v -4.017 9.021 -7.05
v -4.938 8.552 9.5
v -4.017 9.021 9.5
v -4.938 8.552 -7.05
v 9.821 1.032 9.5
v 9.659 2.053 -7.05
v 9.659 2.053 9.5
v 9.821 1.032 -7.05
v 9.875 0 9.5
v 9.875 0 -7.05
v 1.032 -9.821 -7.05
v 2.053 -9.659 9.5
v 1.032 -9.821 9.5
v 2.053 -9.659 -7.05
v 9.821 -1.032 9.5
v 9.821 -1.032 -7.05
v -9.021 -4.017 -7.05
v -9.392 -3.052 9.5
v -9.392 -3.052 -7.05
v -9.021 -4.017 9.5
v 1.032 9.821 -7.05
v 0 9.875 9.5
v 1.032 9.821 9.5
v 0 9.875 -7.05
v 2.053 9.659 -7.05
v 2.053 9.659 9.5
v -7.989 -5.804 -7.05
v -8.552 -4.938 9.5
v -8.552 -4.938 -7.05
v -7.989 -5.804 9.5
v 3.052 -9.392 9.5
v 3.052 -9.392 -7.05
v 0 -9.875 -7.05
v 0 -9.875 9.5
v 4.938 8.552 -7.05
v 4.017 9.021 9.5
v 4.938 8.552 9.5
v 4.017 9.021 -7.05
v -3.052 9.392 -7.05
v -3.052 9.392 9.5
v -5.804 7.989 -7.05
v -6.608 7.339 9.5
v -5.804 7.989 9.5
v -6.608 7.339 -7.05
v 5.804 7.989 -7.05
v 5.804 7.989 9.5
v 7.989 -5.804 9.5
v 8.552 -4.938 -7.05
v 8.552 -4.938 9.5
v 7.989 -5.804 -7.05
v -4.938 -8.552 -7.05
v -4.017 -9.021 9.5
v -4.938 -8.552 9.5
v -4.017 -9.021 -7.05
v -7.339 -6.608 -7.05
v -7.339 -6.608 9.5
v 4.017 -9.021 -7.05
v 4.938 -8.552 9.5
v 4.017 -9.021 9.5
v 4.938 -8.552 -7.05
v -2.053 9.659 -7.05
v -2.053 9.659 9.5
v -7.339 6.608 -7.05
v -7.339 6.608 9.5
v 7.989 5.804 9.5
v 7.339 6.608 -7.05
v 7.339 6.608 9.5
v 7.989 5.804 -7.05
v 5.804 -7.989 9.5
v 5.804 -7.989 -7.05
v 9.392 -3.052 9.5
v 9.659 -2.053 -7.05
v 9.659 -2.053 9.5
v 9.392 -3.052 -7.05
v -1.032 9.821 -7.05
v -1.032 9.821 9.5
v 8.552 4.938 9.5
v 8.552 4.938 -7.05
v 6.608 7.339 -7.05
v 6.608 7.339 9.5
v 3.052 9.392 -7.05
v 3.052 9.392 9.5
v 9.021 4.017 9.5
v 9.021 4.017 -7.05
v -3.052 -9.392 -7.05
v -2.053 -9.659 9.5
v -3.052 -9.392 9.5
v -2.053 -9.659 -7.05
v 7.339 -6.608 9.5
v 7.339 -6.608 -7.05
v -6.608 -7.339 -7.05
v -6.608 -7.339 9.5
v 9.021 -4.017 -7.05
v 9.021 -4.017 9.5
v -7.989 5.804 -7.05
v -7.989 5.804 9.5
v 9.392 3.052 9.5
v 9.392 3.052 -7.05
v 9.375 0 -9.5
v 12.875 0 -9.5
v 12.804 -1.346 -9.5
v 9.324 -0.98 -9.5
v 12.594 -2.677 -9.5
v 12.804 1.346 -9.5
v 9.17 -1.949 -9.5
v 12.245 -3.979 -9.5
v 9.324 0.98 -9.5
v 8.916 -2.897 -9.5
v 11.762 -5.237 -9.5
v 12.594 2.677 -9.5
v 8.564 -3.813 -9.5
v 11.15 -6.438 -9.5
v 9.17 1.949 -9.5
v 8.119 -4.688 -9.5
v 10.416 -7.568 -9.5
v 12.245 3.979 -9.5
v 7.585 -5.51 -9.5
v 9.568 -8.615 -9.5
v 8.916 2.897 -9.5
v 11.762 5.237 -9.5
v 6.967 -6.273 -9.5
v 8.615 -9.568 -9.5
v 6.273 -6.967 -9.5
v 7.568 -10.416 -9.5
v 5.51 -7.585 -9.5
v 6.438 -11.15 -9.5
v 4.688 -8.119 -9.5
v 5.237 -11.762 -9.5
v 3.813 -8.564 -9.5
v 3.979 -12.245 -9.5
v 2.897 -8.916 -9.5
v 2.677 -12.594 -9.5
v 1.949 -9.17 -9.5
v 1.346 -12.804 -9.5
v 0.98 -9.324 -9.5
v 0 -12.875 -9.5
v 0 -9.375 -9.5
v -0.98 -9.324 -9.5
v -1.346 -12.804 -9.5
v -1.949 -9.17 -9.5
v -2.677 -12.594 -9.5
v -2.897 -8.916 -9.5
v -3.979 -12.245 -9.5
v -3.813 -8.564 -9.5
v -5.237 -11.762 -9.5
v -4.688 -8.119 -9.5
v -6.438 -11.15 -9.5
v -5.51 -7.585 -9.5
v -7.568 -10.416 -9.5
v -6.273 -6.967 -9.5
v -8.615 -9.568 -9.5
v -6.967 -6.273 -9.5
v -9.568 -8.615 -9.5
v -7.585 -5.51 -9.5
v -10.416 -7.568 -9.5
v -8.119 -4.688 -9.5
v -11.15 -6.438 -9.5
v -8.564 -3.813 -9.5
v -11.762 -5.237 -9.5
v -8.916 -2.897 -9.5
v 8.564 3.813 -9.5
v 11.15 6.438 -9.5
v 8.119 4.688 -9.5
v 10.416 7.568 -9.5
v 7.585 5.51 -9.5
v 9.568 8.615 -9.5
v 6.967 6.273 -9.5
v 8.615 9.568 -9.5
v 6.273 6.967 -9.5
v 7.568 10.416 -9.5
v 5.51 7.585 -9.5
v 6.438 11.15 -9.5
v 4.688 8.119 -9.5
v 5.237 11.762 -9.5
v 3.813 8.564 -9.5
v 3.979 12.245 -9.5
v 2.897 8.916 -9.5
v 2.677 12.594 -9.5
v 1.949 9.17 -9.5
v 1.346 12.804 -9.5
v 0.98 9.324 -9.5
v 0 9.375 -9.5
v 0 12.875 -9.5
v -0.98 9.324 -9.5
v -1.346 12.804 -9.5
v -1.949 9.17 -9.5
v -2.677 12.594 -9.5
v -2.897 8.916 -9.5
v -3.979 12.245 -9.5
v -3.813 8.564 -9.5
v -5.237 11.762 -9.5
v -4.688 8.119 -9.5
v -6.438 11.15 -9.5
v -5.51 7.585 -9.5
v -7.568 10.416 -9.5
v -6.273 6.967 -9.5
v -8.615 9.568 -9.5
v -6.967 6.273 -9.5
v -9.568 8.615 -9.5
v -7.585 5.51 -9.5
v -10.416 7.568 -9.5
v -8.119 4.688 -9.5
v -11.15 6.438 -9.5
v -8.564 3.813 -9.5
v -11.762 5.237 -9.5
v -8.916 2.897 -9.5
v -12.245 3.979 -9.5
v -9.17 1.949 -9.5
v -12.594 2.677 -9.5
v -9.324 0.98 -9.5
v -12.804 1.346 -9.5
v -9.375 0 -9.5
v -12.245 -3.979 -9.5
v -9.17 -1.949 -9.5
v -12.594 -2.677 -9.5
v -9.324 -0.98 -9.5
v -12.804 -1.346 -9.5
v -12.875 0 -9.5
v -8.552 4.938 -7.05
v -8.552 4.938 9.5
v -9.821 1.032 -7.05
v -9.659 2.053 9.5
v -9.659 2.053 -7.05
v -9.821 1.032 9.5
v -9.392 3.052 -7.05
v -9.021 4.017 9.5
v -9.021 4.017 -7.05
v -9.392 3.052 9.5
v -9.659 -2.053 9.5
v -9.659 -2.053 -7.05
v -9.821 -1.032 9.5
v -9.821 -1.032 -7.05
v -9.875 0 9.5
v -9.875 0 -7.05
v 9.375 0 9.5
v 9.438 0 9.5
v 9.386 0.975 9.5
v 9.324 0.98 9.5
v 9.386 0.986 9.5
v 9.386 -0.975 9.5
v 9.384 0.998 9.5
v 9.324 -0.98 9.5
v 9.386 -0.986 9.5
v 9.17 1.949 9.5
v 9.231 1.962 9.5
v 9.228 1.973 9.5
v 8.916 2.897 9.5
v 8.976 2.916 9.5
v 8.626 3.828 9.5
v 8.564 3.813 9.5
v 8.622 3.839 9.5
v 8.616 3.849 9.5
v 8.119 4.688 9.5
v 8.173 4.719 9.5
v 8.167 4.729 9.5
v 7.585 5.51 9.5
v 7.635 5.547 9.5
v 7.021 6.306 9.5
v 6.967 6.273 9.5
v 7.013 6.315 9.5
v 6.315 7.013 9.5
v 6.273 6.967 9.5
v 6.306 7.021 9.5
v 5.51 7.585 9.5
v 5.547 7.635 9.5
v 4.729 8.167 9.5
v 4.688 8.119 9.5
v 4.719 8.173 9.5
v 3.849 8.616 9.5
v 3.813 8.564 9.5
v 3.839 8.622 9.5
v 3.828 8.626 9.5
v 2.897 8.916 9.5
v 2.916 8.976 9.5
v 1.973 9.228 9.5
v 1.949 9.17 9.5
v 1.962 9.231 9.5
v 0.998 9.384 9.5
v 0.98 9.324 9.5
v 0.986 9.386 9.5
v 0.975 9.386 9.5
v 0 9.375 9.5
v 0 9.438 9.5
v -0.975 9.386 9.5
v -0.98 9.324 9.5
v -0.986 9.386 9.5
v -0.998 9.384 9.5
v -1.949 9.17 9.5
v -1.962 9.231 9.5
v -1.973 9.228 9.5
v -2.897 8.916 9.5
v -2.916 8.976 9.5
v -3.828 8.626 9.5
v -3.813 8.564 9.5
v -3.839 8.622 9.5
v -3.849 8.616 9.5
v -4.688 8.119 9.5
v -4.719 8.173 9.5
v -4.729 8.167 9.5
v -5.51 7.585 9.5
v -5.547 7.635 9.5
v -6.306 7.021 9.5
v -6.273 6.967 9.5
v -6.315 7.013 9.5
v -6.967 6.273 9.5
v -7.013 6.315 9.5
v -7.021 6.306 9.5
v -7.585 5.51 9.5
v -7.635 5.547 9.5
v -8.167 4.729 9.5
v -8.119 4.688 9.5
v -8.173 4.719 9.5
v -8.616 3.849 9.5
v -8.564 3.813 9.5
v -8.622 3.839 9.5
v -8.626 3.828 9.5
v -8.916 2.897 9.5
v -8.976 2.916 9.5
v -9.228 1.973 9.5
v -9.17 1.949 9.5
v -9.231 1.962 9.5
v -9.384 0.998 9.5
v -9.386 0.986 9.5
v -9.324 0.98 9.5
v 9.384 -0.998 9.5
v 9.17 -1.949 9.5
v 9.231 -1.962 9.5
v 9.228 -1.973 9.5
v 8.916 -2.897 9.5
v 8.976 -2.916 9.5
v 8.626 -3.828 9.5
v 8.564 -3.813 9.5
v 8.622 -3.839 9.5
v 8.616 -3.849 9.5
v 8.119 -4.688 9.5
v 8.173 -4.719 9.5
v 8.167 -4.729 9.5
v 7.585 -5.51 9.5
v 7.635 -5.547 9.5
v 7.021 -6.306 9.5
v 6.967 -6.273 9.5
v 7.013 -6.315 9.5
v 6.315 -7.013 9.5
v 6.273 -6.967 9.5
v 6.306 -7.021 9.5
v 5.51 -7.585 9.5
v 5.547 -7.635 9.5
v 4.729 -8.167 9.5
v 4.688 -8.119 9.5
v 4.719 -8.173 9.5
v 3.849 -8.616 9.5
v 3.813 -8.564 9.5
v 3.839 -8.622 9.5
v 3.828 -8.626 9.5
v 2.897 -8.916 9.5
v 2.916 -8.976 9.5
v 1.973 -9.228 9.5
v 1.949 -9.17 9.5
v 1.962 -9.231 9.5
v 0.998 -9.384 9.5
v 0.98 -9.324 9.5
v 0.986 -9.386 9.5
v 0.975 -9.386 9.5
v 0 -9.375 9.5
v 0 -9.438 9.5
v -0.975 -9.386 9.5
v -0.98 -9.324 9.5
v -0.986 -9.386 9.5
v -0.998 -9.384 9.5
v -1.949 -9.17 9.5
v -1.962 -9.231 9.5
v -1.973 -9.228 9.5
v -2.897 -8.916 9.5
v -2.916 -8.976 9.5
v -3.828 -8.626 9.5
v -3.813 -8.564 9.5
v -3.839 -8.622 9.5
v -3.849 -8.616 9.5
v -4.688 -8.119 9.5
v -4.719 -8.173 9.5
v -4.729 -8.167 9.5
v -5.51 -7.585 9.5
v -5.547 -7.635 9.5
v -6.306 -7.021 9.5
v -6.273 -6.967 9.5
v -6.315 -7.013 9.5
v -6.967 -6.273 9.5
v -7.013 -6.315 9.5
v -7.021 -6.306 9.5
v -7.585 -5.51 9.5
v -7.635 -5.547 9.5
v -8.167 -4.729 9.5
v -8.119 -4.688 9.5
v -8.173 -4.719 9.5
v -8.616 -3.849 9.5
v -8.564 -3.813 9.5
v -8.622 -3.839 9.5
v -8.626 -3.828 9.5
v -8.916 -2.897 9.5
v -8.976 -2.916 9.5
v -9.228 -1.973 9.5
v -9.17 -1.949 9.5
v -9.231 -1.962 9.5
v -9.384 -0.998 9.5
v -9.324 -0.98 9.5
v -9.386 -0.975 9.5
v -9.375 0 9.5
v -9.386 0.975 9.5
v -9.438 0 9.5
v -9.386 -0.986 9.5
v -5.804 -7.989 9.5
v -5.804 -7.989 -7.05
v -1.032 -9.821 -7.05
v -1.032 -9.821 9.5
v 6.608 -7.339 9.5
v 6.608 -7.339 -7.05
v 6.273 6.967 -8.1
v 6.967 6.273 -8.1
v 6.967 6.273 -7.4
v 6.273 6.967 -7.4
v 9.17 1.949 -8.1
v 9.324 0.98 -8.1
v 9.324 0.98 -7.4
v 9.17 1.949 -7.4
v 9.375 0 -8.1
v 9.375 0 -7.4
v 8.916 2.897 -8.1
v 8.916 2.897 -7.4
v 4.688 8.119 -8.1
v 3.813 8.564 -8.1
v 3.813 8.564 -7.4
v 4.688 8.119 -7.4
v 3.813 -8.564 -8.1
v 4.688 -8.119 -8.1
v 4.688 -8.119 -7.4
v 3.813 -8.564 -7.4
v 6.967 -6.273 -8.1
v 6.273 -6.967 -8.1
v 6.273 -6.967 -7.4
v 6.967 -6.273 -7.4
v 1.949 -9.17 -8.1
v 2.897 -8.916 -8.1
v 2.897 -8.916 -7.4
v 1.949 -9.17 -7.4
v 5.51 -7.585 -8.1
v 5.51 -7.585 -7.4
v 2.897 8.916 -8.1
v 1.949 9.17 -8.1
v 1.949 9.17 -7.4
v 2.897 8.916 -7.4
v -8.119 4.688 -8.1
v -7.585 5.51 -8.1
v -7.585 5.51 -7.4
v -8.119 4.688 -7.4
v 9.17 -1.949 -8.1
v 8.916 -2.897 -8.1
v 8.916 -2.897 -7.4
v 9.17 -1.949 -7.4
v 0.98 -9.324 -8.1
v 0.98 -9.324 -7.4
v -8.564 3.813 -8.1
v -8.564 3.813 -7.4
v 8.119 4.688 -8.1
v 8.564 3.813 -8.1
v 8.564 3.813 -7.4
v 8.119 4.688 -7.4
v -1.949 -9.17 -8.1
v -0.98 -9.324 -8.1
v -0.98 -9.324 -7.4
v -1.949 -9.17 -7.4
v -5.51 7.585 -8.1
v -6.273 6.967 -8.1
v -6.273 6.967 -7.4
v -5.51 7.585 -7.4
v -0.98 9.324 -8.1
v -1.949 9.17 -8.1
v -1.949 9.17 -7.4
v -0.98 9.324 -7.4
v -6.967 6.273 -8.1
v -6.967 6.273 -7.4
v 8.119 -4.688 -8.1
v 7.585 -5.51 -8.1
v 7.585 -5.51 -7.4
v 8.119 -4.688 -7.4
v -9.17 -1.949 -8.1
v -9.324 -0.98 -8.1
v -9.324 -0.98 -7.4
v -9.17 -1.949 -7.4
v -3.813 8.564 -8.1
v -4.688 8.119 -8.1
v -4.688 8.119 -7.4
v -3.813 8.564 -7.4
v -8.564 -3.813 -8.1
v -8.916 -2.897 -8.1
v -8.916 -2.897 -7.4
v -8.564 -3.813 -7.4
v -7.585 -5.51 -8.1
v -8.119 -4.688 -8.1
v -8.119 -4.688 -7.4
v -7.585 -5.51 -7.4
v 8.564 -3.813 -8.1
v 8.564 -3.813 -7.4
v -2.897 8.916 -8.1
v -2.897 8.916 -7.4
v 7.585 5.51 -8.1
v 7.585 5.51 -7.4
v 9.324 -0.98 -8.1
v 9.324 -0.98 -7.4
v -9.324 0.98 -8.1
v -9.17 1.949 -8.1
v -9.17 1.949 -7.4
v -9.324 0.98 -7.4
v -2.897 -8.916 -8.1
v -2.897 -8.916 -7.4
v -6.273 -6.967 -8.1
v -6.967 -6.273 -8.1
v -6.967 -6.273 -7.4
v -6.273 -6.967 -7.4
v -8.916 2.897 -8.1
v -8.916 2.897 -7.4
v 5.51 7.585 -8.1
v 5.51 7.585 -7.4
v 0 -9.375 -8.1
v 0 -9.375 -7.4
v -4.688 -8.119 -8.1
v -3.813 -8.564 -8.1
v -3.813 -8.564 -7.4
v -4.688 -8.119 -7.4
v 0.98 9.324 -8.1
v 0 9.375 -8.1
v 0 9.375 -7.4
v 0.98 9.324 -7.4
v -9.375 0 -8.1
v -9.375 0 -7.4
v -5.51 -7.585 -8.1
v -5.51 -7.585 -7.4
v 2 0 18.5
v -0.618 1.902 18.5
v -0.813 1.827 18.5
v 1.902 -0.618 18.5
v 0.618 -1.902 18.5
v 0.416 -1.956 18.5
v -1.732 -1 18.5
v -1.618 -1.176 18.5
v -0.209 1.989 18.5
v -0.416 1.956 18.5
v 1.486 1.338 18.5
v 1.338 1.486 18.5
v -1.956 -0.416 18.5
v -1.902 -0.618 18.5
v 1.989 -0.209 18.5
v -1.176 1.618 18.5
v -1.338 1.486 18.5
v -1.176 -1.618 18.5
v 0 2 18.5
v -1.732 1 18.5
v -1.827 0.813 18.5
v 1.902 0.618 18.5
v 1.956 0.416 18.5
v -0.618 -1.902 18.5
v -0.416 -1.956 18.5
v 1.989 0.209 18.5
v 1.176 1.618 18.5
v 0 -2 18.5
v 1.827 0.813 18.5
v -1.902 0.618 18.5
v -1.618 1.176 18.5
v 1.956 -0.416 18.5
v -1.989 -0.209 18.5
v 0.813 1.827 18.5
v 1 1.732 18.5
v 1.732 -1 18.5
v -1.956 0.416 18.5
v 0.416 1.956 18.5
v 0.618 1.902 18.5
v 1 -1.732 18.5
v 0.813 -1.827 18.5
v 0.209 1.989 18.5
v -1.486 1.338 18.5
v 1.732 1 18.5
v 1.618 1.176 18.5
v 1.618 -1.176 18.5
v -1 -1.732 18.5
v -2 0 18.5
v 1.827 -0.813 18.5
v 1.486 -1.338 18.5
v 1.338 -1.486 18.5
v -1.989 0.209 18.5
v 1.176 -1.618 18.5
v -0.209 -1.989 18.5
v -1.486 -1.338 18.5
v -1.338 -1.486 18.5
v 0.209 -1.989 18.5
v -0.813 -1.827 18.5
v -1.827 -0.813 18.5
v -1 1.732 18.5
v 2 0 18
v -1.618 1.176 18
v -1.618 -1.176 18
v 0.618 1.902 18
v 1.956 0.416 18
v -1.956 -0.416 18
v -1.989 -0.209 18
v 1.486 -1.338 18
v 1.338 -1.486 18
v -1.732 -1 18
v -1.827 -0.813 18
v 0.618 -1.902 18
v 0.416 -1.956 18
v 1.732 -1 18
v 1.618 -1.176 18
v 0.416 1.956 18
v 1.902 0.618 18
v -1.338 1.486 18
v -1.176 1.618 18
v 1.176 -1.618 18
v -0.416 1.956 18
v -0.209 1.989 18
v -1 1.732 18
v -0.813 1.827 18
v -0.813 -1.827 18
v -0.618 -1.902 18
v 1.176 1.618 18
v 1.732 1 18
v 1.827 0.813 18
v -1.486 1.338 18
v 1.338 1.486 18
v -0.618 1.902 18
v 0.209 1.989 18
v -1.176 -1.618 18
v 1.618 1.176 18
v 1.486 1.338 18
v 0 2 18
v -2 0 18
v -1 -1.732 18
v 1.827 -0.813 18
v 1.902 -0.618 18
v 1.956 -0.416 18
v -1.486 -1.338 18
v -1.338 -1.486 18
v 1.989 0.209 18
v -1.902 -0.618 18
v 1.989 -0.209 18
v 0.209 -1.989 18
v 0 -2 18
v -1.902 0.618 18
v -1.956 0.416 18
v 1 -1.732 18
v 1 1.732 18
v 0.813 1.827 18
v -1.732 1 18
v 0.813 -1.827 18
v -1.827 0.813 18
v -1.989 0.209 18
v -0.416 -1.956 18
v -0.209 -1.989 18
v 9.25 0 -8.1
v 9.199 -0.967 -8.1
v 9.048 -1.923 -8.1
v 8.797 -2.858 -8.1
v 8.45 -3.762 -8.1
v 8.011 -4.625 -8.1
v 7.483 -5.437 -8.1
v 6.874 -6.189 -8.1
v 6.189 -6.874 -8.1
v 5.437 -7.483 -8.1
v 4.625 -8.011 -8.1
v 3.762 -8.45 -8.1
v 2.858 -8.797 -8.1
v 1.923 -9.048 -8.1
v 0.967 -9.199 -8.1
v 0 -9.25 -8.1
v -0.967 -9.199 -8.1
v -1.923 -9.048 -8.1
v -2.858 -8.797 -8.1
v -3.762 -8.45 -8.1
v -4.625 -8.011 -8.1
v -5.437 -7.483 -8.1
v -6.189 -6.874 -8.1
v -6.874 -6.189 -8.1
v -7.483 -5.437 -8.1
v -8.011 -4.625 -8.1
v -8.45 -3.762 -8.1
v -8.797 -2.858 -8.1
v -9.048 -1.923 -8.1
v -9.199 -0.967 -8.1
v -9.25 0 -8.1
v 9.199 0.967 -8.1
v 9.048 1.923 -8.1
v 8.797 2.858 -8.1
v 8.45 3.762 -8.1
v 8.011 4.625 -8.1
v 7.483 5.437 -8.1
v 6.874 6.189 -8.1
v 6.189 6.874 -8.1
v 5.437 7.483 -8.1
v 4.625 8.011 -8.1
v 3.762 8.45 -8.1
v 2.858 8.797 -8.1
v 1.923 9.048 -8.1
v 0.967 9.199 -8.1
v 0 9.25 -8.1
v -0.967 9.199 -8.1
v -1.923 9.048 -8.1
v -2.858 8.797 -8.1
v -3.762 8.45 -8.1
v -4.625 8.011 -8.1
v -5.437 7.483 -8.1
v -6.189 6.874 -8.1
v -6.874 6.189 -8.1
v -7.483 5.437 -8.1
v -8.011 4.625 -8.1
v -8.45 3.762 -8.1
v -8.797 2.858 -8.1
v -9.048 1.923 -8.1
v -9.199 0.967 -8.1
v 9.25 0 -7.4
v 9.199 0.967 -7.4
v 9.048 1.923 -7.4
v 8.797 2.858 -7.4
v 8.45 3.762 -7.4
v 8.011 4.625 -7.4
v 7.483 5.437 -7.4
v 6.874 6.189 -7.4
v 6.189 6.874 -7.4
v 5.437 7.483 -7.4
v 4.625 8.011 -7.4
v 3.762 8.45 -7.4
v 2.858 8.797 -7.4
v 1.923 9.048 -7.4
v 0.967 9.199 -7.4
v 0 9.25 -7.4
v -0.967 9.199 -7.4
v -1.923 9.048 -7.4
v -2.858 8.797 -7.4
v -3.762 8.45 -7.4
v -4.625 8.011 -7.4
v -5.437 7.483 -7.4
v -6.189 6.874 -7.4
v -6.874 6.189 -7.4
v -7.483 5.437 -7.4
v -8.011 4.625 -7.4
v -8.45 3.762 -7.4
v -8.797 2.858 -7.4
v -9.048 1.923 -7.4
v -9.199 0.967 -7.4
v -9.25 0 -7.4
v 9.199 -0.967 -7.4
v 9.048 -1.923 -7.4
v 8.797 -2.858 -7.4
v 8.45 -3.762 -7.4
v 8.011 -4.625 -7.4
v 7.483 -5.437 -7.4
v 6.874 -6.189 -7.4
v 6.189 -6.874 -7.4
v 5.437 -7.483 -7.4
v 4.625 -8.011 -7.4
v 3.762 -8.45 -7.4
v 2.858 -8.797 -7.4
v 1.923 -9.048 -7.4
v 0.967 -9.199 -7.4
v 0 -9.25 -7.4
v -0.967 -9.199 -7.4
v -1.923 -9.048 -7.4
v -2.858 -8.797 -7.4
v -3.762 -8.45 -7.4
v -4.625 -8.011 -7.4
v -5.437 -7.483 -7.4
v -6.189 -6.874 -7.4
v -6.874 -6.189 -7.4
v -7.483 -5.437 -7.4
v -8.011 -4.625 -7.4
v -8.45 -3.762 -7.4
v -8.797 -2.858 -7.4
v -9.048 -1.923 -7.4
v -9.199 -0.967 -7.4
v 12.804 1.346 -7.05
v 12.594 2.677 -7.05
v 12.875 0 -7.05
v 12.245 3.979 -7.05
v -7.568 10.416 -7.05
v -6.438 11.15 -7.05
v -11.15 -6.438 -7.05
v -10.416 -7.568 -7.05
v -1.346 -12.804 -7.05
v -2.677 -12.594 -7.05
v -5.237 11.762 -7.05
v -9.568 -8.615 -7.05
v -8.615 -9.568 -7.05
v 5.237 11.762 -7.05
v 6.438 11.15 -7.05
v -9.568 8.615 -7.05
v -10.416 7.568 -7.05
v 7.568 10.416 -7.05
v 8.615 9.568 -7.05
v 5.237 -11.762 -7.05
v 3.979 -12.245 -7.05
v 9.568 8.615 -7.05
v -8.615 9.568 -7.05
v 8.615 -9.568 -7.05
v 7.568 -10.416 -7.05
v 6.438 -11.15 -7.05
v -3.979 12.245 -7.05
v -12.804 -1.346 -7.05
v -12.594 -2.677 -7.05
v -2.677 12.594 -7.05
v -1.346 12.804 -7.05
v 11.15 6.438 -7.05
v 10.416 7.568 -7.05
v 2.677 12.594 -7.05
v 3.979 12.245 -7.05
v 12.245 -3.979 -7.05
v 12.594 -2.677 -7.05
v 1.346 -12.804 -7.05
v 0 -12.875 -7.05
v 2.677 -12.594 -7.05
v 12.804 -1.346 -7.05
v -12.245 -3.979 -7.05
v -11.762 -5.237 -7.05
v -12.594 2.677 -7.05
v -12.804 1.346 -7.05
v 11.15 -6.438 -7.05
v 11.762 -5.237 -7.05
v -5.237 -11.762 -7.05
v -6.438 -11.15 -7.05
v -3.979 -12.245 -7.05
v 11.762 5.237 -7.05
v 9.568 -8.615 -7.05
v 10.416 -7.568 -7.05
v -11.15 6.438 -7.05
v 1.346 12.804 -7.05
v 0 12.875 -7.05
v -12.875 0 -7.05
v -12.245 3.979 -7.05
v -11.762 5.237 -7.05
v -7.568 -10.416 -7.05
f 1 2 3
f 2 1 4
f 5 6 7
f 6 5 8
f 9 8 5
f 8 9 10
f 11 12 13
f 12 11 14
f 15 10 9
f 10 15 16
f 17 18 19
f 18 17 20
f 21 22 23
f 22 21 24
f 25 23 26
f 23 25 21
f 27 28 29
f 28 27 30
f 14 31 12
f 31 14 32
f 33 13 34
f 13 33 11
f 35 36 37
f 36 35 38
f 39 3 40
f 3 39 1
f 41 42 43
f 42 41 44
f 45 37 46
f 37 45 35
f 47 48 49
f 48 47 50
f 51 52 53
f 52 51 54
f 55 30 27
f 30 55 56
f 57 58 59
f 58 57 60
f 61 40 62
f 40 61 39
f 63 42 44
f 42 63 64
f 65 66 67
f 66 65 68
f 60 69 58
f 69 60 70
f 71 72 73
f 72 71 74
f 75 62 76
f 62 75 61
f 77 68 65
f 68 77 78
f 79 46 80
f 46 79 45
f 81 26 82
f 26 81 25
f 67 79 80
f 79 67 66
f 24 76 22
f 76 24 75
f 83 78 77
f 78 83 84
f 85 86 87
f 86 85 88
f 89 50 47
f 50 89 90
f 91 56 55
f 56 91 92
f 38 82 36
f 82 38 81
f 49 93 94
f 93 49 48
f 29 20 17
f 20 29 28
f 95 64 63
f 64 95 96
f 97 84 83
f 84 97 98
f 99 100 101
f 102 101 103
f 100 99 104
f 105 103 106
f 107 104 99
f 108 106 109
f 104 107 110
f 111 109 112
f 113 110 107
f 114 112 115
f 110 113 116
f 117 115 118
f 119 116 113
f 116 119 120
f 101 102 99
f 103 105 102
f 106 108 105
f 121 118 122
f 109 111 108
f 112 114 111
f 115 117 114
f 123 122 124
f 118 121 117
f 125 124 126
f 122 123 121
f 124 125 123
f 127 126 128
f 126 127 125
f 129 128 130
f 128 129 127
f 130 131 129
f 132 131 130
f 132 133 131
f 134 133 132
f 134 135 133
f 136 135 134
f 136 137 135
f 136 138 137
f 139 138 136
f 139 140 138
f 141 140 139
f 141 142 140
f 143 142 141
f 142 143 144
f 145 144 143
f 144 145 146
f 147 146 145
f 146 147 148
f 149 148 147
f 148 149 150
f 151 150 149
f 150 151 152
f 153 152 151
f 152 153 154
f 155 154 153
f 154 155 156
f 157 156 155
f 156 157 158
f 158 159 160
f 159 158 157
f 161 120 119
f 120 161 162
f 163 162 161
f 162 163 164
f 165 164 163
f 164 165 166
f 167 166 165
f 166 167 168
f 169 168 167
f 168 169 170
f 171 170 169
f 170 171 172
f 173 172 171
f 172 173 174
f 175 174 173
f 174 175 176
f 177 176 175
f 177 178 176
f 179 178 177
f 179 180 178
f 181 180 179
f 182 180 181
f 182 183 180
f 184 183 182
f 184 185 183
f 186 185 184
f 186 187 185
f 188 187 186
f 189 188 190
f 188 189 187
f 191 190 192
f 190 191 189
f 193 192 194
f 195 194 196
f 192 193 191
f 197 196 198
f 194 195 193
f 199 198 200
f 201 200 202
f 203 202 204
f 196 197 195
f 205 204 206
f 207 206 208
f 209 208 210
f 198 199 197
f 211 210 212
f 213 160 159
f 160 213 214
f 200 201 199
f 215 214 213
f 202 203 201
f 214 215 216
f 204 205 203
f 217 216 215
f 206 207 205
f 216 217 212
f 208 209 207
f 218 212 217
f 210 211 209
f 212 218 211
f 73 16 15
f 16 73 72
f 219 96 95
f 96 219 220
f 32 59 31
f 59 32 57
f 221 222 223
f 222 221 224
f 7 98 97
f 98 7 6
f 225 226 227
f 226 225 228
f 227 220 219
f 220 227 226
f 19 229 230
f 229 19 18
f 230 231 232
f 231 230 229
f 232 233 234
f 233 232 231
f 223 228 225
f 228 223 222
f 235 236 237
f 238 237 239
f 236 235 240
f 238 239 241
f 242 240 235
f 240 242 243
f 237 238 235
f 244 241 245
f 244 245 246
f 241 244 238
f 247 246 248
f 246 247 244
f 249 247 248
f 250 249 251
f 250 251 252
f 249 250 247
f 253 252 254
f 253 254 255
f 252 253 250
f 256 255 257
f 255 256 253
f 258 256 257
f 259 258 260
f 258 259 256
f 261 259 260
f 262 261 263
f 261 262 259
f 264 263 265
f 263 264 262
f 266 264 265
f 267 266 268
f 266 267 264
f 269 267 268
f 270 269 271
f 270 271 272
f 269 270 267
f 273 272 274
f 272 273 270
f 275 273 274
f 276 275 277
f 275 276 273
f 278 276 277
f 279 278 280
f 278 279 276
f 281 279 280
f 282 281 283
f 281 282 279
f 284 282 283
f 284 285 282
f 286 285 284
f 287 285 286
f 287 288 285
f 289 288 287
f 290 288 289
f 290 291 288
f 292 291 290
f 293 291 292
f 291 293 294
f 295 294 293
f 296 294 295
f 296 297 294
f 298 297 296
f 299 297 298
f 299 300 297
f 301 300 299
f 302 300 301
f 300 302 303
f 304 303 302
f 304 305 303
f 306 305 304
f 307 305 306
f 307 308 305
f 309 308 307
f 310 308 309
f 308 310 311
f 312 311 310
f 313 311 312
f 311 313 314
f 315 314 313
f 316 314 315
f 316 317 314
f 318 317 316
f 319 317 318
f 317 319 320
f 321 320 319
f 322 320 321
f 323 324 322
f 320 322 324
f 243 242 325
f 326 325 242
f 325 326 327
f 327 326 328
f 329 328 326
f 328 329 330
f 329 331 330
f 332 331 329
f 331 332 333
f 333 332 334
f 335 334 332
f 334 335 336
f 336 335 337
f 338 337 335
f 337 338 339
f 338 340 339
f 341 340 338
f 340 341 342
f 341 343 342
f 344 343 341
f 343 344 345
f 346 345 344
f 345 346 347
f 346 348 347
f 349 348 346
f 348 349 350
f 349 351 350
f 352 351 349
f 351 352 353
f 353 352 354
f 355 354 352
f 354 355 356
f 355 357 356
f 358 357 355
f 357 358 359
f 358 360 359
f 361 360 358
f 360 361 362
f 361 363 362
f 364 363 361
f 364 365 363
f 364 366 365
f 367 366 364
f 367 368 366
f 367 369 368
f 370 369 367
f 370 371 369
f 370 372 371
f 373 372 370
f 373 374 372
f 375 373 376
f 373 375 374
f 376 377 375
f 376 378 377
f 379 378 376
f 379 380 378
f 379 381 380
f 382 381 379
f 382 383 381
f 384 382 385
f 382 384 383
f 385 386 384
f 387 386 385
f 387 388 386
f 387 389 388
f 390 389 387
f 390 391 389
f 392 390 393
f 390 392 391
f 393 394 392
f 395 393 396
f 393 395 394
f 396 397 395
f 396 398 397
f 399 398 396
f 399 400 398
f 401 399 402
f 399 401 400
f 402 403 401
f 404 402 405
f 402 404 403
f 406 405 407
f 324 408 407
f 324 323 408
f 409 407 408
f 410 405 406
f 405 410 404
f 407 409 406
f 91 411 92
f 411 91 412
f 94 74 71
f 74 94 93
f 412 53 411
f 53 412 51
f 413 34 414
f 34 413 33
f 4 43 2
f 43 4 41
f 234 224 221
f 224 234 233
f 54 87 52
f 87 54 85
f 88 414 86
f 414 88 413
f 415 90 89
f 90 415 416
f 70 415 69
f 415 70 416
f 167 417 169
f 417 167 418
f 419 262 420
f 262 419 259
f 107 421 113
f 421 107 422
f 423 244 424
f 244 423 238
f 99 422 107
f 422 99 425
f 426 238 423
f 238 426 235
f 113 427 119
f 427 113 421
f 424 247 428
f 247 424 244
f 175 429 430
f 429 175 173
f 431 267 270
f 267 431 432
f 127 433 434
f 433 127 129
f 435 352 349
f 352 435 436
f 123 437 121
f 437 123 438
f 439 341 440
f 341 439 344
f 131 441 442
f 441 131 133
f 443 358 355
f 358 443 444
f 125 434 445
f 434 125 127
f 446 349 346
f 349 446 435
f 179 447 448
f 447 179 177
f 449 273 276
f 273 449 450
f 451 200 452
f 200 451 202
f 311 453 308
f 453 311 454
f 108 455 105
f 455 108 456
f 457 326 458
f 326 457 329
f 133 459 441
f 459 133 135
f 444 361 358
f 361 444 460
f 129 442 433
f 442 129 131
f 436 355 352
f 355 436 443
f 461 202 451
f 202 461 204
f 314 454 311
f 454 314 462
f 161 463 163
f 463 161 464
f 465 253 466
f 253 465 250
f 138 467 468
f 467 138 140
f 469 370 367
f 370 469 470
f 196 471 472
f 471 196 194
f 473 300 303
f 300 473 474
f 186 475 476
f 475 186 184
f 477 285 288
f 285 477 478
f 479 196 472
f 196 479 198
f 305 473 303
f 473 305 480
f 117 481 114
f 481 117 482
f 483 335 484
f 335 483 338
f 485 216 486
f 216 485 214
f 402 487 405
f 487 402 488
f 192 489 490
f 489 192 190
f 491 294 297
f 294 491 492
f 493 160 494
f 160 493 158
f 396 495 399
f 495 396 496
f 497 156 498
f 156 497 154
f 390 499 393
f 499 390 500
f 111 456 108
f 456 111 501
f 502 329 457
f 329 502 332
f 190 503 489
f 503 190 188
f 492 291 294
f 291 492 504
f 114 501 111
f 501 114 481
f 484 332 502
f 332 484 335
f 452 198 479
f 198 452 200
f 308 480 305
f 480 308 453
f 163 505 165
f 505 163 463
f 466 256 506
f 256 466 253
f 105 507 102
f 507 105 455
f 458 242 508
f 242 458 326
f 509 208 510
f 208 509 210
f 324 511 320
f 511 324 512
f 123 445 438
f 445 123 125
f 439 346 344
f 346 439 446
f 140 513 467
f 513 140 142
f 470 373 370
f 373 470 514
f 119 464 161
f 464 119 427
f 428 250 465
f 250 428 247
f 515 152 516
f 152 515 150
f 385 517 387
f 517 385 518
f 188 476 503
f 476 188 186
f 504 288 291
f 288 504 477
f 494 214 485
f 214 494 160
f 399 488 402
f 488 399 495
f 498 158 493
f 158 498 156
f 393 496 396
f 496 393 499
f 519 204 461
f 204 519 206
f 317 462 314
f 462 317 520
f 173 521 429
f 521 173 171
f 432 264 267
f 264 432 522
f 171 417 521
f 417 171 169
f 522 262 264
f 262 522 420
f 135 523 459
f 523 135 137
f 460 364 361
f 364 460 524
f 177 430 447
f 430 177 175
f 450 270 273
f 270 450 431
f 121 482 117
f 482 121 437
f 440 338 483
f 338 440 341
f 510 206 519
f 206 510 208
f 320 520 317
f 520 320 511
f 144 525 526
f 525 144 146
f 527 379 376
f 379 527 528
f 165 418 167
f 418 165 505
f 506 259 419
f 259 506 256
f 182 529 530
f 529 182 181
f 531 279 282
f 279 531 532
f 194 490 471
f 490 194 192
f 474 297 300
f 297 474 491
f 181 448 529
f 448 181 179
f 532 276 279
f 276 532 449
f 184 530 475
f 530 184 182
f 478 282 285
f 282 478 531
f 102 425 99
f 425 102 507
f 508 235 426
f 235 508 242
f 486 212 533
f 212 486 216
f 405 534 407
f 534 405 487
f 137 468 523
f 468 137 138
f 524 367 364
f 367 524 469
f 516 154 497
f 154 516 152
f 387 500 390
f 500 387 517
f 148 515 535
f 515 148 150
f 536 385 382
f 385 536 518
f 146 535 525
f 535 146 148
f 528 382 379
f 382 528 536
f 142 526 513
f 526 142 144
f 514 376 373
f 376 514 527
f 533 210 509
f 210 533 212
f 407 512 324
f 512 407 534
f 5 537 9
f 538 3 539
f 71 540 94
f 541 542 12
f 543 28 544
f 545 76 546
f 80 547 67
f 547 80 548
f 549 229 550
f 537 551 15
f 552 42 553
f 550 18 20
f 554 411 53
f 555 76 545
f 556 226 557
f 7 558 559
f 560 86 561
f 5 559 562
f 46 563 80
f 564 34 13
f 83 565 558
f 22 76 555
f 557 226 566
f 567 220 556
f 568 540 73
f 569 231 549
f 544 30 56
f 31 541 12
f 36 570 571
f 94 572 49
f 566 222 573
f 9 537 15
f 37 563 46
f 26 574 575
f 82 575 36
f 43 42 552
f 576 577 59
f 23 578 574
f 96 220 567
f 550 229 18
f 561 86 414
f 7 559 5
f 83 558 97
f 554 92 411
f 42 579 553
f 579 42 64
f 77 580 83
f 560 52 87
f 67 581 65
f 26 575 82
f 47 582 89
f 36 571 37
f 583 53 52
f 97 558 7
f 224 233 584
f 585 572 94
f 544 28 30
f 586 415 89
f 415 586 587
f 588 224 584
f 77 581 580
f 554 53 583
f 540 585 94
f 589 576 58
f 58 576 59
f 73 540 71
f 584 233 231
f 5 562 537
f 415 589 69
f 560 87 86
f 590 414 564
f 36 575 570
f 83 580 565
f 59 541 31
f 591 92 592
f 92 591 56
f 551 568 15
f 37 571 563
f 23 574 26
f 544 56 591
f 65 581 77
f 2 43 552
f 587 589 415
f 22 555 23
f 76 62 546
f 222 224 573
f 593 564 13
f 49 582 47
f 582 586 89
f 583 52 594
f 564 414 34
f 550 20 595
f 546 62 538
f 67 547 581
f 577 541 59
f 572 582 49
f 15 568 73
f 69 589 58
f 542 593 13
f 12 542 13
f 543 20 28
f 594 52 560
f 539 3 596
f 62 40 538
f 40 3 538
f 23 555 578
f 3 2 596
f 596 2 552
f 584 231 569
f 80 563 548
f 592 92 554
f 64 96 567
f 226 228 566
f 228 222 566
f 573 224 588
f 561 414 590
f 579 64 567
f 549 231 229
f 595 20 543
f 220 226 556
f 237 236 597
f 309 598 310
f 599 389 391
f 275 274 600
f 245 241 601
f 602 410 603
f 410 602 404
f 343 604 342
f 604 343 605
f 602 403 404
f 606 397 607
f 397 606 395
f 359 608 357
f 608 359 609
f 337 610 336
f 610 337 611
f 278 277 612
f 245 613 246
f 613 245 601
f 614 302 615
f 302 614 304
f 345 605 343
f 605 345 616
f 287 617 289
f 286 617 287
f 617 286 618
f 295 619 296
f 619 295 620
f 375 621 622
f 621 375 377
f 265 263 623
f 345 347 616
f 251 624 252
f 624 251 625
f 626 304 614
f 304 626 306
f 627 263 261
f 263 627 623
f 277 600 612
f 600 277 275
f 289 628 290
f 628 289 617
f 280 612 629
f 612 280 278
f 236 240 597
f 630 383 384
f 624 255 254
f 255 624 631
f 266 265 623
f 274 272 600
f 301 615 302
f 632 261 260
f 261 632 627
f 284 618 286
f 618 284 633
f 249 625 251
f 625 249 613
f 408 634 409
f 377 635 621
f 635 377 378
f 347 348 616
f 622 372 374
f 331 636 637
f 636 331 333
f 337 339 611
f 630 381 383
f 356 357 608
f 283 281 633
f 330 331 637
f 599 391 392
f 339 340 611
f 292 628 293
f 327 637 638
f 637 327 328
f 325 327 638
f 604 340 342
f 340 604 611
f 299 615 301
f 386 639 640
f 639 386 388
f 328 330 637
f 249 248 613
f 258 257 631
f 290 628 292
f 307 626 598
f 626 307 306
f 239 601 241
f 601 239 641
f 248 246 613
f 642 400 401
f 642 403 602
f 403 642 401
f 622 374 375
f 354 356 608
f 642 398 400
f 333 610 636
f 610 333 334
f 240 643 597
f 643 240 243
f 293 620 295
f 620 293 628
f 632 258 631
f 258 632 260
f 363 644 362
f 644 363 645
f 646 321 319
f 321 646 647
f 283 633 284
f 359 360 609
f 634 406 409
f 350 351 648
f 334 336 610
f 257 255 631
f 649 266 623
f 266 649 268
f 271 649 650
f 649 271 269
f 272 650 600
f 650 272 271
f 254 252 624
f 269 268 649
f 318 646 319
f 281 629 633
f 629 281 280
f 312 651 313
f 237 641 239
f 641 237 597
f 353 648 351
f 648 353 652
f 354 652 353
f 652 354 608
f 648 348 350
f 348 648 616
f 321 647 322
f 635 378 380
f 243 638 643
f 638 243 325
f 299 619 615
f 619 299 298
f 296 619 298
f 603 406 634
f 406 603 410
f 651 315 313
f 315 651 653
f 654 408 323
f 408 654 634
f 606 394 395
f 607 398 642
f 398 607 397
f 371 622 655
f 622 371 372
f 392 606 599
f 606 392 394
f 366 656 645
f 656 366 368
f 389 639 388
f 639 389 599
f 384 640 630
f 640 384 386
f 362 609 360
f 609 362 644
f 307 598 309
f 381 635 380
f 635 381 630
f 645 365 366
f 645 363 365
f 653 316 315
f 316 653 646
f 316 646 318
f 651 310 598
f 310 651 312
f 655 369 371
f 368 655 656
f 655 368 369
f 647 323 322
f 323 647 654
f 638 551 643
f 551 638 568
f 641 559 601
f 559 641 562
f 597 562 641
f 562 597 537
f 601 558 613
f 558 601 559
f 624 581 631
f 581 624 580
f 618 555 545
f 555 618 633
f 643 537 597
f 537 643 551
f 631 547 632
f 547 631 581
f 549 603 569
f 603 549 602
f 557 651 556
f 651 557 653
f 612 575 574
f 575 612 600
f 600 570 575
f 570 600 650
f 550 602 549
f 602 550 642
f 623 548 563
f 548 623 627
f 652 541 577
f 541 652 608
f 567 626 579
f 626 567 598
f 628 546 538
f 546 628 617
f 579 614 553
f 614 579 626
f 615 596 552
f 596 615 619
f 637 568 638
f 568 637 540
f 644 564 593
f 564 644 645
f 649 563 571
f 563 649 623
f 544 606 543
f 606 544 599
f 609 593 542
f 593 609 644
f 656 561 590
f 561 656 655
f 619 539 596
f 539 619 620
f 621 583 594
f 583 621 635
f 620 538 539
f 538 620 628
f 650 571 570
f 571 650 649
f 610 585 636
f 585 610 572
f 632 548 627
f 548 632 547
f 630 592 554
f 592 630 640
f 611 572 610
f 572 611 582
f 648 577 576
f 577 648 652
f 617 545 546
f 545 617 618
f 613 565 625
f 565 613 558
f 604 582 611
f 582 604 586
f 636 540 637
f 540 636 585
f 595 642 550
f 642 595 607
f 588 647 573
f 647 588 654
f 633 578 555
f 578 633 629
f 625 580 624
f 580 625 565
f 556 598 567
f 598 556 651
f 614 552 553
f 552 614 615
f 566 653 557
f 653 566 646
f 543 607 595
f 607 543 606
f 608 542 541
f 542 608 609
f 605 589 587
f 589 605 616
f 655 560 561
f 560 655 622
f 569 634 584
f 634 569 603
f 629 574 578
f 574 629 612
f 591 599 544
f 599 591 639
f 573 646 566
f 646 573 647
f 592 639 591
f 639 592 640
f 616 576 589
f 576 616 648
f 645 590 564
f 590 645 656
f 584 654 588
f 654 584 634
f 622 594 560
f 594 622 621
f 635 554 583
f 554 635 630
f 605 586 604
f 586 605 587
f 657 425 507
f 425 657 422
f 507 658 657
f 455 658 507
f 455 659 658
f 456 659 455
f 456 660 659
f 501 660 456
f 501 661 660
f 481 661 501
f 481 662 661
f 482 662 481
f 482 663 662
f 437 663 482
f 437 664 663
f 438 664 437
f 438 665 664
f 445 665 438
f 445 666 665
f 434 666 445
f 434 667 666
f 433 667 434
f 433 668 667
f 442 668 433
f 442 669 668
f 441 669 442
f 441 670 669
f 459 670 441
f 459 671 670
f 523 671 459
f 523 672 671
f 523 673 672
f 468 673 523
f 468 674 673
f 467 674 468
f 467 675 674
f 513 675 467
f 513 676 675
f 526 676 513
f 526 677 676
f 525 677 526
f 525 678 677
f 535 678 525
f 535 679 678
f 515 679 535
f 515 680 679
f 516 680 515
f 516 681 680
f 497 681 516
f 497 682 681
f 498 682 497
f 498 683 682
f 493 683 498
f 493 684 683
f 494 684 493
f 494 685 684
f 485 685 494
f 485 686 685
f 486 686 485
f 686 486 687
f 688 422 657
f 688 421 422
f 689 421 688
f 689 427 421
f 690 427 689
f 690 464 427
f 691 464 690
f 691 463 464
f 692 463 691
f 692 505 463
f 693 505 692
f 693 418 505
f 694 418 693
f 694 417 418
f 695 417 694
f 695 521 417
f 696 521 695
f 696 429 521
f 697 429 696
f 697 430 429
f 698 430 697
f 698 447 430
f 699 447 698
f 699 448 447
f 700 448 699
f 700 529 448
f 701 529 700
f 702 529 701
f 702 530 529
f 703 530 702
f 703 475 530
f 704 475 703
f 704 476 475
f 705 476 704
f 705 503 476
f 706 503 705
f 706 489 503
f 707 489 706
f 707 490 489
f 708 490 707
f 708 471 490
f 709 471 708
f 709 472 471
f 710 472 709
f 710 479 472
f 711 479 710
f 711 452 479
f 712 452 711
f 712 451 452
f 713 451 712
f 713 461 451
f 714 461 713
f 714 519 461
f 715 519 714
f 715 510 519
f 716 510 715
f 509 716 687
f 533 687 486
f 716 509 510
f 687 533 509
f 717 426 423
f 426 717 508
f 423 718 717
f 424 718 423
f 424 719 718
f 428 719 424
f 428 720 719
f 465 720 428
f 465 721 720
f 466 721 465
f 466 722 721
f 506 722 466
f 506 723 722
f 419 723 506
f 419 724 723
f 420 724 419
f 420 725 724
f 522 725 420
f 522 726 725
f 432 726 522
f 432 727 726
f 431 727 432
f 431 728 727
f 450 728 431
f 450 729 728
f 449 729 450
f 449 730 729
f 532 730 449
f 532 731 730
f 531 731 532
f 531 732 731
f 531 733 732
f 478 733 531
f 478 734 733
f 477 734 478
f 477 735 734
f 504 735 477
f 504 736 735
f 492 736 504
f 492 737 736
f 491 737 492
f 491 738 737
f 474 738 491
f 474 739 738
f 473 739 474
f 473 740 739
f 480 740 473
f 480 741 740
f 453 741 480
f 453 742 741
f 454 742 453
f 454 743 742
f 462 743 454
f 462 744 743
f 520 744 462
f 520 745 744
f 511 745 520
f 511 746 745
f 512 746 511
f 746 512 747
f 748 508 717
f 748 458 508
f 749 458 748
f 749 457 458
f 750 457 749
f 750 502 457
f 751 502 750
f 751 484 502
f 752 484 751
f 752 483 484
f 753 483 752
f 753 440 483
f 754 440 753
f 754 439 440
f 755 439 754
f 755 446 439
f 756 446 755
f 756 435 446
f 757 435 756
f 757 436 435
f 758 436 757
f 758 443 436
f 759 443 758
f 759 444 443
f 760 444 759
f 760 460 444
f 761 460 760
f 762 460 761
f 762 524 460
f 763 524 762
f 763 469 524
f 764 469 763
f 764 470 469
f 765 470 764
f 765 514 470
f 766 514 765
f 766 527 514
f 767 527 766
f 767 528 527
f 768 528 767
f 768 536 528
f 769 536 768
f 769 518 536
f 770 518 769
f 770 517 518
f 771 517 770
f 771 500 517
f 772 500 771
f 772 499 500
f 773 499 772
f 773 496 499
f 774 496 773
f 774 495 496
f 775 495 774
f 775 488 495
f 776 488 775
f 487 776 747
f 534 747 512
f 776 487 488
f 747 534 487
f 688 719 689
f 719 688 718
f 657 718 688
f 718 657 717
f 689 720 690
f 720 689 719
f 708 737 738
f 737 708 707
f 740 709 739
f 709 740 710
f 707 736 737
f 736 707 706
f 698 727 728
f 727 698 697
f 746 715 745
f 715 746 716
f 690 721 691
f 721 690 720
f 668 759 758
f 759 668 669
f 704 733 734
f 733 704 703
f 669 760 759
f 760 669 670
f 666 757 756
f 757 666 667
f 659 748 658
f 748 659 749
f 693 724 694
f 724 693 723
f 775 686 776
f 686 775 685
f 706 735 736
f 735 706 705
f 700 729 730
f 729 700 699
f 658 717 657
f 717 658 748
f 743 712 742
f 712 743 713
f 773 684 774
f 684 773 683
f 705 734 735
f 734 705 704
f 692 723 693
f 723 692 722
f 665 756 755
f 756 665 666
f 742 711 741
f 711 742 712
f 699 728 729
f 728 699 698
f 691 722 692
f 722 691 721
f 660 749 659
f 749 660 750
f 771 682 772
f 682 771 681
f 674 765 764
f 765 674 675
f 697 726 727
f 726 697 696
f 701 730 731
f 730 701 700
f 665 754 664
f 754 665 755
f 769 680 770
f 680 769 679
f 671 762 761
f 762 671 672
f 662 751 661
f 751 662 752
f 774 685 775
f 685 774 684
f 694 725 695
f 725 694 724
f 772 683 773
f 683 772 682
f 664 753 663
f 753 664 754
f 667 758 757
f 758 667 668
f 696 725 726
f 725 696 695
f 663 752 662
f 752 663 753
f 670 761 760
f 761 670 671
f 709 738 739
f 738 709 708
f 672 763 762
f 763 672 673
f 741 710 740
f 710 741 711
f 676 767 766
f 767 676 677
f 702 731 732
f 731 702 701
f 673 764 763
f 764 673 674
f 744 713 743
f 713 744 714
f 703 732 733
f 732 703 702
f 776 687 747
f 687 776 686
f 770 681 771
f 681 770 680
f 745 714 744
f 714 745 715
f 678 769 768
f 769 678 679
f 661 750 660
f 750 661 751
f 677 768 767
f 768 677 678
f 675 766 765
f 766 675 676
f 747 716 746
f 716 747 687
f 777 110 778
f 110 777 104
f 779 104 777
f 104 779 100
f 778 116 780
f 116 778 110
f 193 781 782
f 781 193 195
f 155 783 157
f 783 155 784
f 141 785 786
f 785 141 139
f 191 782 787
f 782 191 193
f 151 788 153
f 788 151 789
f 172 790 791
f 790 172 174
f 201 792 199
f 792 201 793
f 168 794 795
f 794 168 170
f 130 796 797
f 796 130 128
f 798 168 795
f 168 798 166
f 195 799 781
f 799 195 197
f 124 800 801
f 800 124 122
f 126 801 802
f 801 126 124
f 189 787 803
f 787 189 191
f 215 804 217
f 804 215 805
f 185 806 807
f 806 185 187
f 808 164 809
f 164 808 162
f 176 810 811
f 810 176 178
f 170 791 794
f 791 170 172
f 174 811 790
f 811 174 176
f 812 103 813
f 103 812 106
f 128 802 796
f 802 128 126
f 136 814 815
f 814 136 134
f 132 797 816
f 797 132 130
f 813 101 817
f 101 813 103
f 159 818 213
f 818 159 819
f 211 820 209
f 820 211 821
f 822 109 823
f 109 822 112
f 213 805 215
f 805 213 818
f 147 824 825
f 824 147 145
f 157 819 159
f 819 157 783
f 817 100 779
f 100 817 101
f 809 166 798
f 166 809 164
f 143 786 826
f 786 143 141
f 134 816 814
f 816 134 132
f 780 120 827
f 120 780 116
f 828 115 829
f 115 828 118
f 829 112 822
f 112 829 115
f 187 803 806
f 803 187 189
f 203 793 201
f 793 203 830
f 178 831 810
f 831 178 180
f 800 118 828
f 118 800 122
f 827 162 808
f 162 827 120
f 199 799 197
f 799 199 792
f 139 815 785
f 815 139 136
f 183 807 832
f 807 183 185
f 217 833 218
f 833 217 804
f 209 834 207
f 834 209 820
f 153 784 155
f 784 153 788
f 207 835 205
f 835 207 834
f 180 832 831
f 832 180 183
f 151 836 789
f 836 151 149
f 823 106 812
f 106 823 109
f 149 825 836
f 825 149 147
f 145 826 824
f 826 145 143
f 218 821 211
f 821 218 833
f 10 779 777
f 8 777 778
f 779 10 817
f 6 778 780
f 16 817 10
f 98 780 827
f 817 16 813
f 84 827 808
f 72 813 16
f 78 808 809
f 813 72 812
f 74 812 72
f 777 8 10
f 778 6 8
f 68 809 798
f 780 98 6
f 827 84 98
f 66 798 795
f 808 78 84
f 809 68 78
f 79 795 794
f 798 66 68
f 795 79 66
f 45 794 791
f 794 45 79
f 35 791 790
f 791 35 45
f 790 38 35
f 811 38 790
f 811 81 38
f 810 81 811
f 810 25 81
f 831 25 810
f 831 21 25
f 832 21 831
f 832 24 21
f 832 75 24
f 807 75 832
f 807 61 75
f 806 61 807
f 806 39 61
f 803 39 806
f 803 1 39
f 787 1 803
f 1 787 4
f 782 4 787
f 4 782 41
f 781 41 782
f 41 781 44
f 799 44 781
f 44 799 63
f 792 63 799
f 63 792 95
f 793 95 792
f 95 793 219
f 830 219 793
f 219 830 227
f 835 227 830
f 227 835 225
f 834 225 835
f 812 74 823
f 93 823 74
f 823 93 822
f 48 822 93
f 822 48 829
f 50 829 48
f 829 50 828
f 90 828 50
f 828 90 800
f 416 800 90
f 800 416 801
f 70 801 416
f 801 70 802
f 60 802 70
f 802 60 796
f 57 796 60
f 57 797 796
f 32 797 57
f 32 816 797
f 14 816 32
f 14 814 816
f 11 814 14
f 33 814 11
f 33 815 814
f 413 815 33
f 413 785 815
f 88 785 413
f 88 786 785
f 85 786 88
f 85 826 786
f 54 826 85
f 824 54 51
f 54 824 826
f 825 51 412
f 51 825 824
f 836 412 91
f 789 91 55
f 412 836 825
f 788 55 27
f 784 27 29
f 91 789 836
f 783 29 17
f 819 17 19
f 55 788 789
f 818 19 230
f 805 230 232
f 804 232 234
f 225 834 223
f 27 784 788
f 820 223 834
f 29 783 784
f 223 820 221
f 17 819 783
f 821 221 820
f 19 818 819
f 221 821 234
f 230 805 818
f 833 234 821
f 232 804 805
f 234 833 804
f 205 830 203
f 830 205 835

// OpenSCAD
$fn = 60;

outer_diameter = 19.75;
thickness = 1;
lip_thickness = 0.25;
height = 20;

inner_lip_diameter = outer_diameter - thickness - lip_thickness;
inner_lip_bottom = 1.75;
inner_lip_top = 2.45;

nozzle_height = 8;
noddle_width = 2;

inner_diameter = outer_diameter - thickness;
inner_lip_height = inner_lip_top - inner_lip_bottom;
cylinder_height = height - thickness; // So we can put a "disc" on the top

union()
{
    // Outer cylinder
    difference()
    {
        cylinder(h = cylinder_height, r = outer_diameter / 2, center = true);
        cylinder(h = cylinder_height, r = inner_diameter / 2, center = true);
    }

    // top
    difference()
    {
        color("red") difference()
        {
            translate([ 0, 0, cylinder_height / 2 ])
                cylinder(h = thickness + nozzle_height, r1 = outer_diameter / 2, r2 = noddle_width, center = false);
            translate([ 0, 0, (cylinder_height / 2) - (thickness / 2) ])
                cylinder(h = thickness + nozzle_height, r1 = (outer_diameter / 2), r2 = noddle_width, center = false);
        }
        cylinder(h = cylinder_height * 2, r = 2);
    }
    // lip
    color("green") translate([ 0, 0, (-(cylinder_height) / 2) + inner_lip_bottom ]) difference()
    {
        cylinder(h = inner_lip_height, r = inner_diameter / 2, center = true);
        cylinder(h = inner_lip_height, r = inner_lip_diameter / 2, center = true);
    }

    // base
    color("green") translate([ 0, 0, -(cylinder_height / 2) ]) difference()
    {
        cylinder(h = inner_lip_top, r = (outer_diameter / 2) + 3, center = false);
        cylinder(h = inner_lip_top, r = (inner_diameter / 2), center = false);
    }
}
